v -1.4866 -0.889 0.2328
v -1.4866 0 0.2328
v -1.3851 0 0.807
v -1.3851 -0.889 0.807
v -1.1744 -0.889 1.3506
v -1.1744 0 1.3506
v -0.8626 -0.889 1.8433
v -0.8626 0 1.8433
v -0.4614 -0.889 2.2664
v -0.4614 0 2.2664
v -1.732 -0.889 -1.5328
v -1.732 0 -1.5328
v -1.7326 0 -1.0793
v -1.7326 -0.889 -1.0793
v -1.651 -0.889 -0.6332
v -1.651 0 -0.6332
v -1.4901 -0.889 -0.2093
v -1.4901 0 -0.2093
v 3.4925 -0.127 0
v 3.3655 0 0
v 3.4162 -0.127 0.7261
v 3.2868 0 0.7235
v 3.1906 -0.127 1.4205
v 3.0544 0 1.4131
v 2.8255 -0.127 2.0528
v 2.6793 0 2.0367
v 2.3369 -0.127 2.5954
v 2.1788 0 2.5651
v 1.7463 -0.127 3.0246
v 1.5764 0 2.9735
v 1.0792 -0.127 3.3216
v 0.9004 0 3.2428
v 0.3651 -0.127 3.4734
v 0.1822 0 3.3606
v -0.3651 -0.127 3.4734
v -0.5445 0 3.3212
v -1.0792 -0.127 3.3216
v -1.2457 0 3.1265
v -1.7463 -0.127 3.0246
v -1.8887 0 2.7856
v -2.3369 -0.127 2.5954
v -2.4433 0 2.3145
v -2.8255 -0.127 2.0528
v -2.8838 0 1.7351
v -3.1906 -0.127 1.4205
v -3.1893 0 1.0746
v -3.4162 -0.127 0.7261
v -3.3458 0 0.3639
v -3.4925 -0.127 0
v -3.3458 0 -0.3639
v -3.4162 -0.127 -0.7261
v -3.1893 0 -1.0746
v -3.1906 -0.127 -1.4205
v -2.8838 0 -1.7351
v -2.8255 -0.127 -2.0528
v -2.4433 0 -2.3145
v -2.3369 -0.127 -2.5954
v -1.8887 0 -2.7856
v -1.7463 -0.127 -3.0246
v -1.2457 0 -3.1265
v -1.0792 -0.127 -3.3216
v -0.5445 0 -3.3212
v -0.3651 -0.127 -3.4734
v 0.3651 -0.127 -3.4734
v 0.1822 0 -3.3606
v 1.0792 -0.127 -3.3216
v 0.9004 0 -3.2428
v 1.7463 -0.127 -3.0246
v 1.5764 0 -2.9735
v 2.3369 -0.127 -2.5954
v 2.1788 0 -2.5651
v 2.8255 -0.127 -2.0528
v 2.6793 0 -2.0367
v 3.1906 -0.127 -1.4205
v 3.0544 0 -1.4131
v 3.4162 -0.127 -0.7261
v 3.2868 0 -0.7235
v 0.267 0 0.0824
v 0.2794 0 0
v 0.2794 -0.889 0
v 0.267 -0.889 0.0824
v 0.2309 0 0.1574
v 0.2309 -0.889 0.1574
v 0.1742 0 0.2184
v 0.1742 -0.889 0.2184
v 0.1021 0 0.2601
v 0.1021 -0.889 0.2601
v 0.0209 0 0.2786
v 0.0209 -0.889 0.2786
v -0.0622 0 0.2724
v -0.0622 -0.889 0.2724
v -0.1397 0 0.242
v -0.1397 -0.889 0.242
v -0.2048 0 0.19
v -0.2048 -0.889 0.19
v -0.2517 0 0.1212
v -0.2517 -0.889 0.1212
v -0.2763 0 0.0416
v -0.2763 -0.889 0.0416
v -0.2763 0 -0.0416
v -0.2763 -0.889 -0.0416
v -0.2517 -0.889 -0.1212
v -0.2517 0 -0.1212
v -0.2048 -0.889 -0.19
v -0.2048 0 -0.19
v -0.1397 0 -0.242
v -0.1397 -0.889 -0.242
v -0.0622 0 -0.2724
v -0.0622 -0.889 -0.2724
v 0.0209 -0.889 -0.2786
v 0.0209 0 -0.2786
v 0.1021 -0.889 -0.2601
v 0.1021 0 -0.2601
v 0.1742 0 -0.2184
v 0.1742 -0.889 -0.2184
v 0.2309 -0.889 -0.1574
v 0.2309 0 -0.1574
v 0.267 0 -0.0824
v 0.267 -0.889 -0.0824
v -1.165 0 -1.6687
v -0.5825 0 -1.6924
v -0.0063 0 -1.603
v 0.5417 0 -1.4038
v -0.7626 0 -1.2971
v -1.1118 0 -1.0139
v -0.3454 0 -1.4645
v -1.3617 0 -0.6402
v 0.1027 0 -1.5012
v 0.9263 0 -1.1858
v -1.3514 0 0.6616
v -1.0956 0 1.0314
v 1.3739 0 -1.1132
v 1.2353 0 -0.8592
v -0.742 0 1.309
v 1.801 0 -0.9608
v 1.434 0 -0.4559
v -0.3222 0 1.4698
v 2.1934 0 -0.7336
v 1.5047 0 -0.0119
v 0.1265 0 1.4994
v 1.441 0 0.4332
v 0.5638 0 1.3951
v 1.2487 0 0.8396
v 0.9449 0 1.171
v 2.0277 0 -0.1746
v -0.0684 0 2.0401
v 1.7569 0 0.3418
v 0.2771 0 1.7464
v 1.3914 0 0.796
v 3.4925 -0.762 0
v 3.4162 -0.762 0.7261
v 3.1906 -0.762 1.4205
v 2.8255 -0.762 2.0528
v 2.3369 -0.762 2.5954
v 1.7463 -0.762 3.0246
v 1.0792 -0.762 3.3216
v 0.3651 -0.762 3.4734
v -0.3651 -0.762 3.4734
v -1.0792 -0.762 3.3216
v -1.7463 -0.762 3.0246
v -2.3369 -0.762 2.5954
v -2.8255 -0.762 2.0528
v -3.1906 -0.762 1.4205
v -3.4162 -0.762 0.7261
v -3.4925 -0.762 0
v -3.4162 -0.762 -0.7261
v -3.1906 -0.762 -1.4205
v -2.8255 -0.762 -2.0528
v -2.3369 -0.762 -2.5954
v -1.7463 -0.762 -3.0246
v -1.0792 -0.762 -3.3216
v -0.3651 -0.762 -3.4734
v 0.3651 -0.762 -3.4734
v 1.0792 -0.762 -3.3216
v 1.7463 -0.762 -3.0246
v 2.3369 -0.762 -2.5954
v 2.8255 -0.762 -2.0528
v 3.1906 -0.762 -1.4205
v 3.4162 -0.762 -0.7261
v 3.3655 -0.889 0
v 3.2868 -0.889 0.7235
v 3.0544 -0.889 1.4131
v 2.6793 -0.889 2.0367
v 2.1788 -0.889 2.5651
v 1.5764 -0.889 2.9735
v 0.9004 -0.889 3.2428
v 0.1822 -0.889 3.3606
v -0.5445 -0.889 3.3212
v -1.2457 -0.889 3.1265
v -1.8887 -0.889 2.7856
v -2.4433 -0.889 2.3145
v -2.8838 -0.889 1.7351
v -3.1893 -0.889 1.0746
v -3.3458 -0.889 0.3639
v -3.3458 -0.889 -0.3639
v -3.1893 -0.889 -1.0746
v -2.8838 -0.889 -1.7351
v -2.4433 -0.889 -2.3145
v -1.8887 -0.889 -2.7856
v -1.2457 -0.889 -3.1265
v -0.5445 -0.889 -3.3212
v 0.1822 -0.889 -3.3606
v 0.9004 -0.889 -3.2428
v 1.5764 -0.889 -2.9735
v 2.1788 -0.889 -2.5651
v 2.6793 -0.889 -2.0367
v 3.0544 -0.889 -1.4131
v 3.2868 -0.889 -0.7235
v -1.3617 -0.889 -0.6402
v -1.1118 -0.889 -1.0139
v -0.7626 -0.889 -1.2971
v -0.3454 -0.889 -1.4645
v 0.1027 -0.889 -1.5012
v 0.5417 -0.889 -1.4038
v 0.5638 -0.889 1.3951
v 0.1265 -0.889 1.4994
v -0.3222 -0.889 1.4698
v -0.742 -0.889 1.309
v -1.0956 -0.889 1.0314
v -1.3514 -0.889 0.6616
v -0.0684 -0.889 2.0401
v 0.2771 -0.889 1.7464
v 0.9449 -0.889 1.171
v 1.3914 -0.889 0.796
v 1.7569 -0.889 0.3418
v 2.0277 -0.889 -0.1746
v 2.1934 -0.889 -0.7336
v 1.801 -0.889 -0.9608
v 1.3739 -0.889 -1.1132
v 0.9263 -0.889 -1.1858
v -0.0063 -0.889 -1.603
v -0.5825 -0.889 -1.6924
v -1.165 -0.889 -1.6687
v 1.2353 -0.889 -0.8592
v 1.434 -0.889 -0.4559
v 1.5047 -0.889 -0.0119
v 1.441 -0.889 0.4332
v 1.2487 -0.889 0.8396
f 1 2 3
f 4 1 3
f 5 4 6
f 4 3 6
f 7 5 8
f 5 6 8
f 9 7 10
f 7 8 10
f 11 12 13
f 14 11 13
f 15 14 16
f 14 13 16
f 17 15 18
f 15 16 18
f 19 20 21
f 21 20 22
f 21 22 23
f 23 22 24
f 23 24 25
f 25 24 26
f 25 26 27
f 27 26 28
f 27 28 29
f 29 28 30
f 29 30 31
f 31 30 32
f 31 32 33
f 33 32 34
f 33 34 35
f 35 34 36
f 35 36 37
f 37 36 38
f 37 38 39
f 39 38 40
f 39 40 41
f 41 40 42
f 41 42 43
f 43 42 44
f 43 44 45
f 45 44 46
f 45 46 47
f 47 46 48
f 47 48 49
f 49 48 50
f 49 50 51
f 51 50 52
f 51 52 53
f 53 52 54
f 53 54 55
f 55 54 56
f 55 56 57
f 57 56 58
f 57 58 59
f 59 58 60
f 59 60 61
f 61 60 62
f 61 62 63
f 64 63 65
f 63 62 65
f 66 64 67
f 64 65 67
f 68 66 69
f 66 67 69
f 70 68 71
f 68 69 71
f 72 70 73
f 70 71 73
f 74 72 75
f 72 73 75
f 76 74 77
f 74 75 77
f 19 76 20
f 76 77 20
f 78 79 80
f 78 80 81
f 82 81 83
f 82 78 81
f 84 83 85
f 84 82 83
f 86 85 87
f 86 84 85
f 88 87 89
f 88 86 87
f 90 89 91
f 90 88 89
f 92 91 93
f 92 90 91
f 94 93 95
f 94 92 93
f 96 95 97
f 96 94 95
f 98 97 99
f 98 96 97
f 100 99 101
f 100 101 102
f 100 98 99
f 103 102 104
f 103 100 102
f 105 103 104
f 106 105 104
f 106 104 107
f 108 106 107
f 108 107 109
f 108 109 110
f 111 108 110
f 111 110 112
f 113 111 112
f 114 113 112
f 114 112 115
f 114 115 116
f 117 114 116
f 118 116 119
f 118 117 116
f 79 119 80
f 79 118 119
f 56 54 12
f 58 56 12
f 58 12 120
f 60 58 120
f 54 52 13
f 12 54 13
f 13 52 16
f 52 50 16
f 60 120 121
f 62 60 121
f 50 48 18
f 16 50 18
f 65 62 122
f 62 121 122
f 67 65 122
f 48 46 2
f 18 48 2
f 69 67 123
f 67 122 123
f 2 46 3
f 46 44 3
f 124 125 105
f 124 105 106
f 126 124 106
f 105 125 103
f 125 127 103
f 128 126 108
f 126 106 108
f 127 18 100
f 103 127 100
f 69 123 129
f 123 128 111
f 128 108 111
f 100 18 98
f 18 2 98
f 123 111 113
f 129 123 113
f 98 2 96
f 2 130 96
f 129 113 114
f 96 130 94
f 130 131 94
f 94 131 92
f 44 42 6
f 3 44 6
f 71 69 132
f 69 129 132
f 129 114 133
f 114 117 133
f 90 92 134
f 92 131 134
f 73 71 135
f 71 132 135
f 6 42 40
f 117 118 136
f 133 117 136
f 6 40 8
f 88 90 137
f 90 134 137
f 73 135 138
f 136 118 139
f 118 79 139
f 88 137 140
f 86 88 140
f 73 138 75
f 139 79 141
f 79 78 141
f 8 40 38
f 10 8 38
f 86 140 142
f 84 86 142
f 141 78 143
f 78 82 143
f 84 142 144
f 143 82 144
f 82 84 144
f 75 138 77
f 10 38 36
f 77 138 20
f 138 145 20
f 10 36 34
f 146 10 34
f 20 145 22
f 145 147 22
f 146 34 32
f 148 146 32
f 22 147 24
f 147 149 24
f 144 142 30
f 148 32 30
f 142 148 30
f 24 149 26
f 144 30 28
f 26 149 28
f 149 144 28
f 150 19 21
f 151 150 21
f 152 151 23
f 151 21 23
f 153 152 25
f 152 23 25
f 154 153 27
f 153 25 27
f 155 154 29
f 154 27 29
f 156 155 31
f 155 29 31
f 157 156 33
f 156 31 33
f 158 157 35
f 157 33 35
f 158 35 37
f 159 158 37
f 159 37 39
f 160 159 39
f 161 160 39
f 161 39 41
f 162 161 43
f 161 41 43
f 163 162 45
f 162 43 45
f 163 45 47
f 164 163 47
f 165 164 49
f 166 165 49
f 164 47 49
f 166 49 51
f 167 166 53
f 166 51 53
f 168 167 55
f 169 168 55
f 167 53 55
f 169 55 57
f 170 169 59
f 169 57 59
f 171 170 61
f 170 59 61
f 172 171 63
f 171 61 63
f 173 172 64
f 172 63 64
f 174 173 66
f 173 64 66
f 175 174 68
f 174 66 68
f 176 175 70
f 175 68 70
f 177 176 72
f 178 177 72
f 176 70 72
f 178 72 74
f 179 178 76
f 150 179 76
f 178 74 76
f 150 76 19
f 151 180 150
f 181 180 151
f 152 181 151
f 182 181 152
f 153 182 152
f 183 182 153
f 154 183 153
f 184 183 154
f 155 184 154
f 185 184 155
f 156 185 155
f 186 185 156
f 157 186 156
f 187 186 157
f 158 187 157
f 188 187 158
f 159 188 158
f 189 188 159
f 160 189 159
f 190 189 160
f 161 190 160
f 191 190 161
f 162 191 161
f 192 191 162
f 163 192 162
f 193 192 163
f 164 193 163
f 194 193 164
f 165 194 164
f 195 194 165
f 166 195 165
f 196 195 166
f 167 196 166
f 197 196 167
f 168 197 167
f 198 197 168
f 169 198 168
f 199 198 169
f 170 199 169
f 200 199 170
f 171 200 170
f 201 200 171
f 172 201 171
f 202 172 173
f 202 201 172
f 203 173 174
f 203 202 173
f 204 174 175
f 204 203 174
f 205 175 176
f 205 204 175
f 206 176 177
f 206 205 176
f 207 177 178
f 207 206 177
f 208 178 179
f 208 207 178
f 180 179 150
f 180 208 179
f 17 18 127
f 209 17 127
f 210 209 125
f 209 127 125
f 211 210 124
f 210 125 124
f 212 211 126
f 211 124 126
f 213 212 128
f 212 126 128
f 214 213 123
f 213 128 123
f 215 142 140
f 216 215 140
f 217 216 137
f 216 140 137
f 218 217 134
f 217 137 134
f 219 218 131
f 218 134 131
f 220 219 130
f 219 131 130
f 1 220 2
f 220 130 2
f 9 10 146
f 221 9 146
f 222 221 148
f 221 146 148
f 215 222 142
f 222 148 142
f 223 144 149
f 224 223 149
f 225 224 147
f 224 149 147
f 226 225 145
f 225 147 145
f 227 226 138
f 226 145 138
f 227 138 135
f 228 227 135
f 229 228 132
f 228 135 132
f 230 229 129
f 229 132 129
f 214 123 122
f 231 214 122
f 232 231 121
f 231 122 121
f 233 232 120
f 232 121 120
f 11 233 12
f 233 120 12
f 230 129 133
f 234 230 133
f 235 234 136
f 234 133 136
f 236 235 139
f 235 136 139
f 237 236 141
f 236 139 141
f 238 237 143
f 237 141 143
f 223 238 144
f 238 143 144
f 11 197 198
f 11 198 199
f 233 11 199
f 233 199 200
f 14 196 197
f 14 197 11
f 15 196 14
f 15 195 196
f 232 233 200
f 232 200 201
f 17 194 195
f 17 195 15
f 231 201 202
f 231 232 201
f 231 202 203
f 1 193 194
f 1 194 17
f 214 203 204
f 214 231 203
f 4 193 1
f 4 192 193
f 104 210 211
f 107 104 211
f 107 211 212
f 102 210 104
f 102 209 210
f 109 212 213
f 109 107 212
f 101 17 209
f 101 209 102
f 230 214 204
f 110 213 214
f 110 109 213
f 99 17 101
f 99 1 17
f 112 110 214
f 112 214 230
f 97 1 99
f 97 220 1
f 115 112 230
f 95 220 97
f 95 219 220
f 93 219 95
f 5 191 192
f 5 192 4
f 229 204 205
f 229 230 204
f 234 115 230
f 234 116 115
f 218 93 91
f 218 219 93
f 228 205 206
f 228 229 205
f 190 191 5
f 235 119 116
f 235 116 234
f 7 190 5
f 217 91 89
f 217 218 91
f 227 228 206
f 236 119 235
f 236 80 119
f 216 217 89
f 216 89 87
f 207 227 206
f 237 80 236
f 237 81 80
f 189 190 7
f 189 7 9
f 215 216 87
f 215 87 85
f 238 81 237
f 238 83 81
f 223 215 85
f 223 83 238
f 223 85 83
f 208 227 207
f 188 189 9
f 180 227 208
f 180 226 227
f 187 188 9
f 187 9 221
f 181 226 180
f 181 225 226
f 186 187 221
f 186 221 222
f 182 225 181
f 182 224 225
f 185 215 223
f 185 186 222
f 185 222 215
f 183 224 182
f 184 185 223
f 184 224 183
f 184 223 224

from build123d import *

# Parameters (mm, degrees)
F0_R     = 3.4925
F0_R_2   = 0.2794
F1_DEPTH = 0.889
F2_SIZE  = 0.127


with BuildPart() as f1:
    # F0 (on Front) → F1 (new body)
    with BuildSketch(Plane.XZ):
        Circle(F0_R)
        with BuildLine():
            ThreePointArc((0.541666, -1.403826), (-0.582476, -1.692408), (-1.732036, -1.532768))
            ThreePointArc((-1.732036, -1.532768), (-1.70195, -0.854412), (-1.490076, -0.209291))
            ThreePointArc((-1.490076, -0.209291), (-0.762626, -1.297124), (0.541666, -1.403826))
        make_face(mode=Mode.SUBTRACT)
        Circle(F0_R_2, mode=Mode.SUBTRACT)
        with BuildLine():
            ThreePointArc((0.944916, 1.17101), (1.756906, 0.341765), (2.193434, -0.733604))
            ThreePointArc((2.193434, -0.733604), (1.590918, -1.046726), (0.92629, -1.185799))
            ThreePointArc((0.92629, -1.185799), (1.504656, -0.011892), (0.944916, 1.17101))
        make_face(mode=Mode.SUBTRACT)
        with BuildLine():
            ThreePointArc((-0.461398, 2.266371), (0.111032, 1.901138), (0.563787, 1.39509))
            ThreePointArc((0.563787, 1.39509), (-0.742029, 1.309016), (-1.486582, 0.232816))
            ThreePointArc((-1.486582, 0.232816), (-1.17443, 1.350643), (-0.461398, 2.266371))
        make_face(mode=Mode.SUBTRACT)
    extrude(amount=F1_DEPTH)

    # F2
    f2_edges = [f1.edges().sort_by_distance(p)[0] for p in [
        (-3.4925, -0.889, 0),
        (-3.4925, 0, 0),
    ]]
    chamfer(f2_edges, length=F2_SIZE)


solid = f1.part
